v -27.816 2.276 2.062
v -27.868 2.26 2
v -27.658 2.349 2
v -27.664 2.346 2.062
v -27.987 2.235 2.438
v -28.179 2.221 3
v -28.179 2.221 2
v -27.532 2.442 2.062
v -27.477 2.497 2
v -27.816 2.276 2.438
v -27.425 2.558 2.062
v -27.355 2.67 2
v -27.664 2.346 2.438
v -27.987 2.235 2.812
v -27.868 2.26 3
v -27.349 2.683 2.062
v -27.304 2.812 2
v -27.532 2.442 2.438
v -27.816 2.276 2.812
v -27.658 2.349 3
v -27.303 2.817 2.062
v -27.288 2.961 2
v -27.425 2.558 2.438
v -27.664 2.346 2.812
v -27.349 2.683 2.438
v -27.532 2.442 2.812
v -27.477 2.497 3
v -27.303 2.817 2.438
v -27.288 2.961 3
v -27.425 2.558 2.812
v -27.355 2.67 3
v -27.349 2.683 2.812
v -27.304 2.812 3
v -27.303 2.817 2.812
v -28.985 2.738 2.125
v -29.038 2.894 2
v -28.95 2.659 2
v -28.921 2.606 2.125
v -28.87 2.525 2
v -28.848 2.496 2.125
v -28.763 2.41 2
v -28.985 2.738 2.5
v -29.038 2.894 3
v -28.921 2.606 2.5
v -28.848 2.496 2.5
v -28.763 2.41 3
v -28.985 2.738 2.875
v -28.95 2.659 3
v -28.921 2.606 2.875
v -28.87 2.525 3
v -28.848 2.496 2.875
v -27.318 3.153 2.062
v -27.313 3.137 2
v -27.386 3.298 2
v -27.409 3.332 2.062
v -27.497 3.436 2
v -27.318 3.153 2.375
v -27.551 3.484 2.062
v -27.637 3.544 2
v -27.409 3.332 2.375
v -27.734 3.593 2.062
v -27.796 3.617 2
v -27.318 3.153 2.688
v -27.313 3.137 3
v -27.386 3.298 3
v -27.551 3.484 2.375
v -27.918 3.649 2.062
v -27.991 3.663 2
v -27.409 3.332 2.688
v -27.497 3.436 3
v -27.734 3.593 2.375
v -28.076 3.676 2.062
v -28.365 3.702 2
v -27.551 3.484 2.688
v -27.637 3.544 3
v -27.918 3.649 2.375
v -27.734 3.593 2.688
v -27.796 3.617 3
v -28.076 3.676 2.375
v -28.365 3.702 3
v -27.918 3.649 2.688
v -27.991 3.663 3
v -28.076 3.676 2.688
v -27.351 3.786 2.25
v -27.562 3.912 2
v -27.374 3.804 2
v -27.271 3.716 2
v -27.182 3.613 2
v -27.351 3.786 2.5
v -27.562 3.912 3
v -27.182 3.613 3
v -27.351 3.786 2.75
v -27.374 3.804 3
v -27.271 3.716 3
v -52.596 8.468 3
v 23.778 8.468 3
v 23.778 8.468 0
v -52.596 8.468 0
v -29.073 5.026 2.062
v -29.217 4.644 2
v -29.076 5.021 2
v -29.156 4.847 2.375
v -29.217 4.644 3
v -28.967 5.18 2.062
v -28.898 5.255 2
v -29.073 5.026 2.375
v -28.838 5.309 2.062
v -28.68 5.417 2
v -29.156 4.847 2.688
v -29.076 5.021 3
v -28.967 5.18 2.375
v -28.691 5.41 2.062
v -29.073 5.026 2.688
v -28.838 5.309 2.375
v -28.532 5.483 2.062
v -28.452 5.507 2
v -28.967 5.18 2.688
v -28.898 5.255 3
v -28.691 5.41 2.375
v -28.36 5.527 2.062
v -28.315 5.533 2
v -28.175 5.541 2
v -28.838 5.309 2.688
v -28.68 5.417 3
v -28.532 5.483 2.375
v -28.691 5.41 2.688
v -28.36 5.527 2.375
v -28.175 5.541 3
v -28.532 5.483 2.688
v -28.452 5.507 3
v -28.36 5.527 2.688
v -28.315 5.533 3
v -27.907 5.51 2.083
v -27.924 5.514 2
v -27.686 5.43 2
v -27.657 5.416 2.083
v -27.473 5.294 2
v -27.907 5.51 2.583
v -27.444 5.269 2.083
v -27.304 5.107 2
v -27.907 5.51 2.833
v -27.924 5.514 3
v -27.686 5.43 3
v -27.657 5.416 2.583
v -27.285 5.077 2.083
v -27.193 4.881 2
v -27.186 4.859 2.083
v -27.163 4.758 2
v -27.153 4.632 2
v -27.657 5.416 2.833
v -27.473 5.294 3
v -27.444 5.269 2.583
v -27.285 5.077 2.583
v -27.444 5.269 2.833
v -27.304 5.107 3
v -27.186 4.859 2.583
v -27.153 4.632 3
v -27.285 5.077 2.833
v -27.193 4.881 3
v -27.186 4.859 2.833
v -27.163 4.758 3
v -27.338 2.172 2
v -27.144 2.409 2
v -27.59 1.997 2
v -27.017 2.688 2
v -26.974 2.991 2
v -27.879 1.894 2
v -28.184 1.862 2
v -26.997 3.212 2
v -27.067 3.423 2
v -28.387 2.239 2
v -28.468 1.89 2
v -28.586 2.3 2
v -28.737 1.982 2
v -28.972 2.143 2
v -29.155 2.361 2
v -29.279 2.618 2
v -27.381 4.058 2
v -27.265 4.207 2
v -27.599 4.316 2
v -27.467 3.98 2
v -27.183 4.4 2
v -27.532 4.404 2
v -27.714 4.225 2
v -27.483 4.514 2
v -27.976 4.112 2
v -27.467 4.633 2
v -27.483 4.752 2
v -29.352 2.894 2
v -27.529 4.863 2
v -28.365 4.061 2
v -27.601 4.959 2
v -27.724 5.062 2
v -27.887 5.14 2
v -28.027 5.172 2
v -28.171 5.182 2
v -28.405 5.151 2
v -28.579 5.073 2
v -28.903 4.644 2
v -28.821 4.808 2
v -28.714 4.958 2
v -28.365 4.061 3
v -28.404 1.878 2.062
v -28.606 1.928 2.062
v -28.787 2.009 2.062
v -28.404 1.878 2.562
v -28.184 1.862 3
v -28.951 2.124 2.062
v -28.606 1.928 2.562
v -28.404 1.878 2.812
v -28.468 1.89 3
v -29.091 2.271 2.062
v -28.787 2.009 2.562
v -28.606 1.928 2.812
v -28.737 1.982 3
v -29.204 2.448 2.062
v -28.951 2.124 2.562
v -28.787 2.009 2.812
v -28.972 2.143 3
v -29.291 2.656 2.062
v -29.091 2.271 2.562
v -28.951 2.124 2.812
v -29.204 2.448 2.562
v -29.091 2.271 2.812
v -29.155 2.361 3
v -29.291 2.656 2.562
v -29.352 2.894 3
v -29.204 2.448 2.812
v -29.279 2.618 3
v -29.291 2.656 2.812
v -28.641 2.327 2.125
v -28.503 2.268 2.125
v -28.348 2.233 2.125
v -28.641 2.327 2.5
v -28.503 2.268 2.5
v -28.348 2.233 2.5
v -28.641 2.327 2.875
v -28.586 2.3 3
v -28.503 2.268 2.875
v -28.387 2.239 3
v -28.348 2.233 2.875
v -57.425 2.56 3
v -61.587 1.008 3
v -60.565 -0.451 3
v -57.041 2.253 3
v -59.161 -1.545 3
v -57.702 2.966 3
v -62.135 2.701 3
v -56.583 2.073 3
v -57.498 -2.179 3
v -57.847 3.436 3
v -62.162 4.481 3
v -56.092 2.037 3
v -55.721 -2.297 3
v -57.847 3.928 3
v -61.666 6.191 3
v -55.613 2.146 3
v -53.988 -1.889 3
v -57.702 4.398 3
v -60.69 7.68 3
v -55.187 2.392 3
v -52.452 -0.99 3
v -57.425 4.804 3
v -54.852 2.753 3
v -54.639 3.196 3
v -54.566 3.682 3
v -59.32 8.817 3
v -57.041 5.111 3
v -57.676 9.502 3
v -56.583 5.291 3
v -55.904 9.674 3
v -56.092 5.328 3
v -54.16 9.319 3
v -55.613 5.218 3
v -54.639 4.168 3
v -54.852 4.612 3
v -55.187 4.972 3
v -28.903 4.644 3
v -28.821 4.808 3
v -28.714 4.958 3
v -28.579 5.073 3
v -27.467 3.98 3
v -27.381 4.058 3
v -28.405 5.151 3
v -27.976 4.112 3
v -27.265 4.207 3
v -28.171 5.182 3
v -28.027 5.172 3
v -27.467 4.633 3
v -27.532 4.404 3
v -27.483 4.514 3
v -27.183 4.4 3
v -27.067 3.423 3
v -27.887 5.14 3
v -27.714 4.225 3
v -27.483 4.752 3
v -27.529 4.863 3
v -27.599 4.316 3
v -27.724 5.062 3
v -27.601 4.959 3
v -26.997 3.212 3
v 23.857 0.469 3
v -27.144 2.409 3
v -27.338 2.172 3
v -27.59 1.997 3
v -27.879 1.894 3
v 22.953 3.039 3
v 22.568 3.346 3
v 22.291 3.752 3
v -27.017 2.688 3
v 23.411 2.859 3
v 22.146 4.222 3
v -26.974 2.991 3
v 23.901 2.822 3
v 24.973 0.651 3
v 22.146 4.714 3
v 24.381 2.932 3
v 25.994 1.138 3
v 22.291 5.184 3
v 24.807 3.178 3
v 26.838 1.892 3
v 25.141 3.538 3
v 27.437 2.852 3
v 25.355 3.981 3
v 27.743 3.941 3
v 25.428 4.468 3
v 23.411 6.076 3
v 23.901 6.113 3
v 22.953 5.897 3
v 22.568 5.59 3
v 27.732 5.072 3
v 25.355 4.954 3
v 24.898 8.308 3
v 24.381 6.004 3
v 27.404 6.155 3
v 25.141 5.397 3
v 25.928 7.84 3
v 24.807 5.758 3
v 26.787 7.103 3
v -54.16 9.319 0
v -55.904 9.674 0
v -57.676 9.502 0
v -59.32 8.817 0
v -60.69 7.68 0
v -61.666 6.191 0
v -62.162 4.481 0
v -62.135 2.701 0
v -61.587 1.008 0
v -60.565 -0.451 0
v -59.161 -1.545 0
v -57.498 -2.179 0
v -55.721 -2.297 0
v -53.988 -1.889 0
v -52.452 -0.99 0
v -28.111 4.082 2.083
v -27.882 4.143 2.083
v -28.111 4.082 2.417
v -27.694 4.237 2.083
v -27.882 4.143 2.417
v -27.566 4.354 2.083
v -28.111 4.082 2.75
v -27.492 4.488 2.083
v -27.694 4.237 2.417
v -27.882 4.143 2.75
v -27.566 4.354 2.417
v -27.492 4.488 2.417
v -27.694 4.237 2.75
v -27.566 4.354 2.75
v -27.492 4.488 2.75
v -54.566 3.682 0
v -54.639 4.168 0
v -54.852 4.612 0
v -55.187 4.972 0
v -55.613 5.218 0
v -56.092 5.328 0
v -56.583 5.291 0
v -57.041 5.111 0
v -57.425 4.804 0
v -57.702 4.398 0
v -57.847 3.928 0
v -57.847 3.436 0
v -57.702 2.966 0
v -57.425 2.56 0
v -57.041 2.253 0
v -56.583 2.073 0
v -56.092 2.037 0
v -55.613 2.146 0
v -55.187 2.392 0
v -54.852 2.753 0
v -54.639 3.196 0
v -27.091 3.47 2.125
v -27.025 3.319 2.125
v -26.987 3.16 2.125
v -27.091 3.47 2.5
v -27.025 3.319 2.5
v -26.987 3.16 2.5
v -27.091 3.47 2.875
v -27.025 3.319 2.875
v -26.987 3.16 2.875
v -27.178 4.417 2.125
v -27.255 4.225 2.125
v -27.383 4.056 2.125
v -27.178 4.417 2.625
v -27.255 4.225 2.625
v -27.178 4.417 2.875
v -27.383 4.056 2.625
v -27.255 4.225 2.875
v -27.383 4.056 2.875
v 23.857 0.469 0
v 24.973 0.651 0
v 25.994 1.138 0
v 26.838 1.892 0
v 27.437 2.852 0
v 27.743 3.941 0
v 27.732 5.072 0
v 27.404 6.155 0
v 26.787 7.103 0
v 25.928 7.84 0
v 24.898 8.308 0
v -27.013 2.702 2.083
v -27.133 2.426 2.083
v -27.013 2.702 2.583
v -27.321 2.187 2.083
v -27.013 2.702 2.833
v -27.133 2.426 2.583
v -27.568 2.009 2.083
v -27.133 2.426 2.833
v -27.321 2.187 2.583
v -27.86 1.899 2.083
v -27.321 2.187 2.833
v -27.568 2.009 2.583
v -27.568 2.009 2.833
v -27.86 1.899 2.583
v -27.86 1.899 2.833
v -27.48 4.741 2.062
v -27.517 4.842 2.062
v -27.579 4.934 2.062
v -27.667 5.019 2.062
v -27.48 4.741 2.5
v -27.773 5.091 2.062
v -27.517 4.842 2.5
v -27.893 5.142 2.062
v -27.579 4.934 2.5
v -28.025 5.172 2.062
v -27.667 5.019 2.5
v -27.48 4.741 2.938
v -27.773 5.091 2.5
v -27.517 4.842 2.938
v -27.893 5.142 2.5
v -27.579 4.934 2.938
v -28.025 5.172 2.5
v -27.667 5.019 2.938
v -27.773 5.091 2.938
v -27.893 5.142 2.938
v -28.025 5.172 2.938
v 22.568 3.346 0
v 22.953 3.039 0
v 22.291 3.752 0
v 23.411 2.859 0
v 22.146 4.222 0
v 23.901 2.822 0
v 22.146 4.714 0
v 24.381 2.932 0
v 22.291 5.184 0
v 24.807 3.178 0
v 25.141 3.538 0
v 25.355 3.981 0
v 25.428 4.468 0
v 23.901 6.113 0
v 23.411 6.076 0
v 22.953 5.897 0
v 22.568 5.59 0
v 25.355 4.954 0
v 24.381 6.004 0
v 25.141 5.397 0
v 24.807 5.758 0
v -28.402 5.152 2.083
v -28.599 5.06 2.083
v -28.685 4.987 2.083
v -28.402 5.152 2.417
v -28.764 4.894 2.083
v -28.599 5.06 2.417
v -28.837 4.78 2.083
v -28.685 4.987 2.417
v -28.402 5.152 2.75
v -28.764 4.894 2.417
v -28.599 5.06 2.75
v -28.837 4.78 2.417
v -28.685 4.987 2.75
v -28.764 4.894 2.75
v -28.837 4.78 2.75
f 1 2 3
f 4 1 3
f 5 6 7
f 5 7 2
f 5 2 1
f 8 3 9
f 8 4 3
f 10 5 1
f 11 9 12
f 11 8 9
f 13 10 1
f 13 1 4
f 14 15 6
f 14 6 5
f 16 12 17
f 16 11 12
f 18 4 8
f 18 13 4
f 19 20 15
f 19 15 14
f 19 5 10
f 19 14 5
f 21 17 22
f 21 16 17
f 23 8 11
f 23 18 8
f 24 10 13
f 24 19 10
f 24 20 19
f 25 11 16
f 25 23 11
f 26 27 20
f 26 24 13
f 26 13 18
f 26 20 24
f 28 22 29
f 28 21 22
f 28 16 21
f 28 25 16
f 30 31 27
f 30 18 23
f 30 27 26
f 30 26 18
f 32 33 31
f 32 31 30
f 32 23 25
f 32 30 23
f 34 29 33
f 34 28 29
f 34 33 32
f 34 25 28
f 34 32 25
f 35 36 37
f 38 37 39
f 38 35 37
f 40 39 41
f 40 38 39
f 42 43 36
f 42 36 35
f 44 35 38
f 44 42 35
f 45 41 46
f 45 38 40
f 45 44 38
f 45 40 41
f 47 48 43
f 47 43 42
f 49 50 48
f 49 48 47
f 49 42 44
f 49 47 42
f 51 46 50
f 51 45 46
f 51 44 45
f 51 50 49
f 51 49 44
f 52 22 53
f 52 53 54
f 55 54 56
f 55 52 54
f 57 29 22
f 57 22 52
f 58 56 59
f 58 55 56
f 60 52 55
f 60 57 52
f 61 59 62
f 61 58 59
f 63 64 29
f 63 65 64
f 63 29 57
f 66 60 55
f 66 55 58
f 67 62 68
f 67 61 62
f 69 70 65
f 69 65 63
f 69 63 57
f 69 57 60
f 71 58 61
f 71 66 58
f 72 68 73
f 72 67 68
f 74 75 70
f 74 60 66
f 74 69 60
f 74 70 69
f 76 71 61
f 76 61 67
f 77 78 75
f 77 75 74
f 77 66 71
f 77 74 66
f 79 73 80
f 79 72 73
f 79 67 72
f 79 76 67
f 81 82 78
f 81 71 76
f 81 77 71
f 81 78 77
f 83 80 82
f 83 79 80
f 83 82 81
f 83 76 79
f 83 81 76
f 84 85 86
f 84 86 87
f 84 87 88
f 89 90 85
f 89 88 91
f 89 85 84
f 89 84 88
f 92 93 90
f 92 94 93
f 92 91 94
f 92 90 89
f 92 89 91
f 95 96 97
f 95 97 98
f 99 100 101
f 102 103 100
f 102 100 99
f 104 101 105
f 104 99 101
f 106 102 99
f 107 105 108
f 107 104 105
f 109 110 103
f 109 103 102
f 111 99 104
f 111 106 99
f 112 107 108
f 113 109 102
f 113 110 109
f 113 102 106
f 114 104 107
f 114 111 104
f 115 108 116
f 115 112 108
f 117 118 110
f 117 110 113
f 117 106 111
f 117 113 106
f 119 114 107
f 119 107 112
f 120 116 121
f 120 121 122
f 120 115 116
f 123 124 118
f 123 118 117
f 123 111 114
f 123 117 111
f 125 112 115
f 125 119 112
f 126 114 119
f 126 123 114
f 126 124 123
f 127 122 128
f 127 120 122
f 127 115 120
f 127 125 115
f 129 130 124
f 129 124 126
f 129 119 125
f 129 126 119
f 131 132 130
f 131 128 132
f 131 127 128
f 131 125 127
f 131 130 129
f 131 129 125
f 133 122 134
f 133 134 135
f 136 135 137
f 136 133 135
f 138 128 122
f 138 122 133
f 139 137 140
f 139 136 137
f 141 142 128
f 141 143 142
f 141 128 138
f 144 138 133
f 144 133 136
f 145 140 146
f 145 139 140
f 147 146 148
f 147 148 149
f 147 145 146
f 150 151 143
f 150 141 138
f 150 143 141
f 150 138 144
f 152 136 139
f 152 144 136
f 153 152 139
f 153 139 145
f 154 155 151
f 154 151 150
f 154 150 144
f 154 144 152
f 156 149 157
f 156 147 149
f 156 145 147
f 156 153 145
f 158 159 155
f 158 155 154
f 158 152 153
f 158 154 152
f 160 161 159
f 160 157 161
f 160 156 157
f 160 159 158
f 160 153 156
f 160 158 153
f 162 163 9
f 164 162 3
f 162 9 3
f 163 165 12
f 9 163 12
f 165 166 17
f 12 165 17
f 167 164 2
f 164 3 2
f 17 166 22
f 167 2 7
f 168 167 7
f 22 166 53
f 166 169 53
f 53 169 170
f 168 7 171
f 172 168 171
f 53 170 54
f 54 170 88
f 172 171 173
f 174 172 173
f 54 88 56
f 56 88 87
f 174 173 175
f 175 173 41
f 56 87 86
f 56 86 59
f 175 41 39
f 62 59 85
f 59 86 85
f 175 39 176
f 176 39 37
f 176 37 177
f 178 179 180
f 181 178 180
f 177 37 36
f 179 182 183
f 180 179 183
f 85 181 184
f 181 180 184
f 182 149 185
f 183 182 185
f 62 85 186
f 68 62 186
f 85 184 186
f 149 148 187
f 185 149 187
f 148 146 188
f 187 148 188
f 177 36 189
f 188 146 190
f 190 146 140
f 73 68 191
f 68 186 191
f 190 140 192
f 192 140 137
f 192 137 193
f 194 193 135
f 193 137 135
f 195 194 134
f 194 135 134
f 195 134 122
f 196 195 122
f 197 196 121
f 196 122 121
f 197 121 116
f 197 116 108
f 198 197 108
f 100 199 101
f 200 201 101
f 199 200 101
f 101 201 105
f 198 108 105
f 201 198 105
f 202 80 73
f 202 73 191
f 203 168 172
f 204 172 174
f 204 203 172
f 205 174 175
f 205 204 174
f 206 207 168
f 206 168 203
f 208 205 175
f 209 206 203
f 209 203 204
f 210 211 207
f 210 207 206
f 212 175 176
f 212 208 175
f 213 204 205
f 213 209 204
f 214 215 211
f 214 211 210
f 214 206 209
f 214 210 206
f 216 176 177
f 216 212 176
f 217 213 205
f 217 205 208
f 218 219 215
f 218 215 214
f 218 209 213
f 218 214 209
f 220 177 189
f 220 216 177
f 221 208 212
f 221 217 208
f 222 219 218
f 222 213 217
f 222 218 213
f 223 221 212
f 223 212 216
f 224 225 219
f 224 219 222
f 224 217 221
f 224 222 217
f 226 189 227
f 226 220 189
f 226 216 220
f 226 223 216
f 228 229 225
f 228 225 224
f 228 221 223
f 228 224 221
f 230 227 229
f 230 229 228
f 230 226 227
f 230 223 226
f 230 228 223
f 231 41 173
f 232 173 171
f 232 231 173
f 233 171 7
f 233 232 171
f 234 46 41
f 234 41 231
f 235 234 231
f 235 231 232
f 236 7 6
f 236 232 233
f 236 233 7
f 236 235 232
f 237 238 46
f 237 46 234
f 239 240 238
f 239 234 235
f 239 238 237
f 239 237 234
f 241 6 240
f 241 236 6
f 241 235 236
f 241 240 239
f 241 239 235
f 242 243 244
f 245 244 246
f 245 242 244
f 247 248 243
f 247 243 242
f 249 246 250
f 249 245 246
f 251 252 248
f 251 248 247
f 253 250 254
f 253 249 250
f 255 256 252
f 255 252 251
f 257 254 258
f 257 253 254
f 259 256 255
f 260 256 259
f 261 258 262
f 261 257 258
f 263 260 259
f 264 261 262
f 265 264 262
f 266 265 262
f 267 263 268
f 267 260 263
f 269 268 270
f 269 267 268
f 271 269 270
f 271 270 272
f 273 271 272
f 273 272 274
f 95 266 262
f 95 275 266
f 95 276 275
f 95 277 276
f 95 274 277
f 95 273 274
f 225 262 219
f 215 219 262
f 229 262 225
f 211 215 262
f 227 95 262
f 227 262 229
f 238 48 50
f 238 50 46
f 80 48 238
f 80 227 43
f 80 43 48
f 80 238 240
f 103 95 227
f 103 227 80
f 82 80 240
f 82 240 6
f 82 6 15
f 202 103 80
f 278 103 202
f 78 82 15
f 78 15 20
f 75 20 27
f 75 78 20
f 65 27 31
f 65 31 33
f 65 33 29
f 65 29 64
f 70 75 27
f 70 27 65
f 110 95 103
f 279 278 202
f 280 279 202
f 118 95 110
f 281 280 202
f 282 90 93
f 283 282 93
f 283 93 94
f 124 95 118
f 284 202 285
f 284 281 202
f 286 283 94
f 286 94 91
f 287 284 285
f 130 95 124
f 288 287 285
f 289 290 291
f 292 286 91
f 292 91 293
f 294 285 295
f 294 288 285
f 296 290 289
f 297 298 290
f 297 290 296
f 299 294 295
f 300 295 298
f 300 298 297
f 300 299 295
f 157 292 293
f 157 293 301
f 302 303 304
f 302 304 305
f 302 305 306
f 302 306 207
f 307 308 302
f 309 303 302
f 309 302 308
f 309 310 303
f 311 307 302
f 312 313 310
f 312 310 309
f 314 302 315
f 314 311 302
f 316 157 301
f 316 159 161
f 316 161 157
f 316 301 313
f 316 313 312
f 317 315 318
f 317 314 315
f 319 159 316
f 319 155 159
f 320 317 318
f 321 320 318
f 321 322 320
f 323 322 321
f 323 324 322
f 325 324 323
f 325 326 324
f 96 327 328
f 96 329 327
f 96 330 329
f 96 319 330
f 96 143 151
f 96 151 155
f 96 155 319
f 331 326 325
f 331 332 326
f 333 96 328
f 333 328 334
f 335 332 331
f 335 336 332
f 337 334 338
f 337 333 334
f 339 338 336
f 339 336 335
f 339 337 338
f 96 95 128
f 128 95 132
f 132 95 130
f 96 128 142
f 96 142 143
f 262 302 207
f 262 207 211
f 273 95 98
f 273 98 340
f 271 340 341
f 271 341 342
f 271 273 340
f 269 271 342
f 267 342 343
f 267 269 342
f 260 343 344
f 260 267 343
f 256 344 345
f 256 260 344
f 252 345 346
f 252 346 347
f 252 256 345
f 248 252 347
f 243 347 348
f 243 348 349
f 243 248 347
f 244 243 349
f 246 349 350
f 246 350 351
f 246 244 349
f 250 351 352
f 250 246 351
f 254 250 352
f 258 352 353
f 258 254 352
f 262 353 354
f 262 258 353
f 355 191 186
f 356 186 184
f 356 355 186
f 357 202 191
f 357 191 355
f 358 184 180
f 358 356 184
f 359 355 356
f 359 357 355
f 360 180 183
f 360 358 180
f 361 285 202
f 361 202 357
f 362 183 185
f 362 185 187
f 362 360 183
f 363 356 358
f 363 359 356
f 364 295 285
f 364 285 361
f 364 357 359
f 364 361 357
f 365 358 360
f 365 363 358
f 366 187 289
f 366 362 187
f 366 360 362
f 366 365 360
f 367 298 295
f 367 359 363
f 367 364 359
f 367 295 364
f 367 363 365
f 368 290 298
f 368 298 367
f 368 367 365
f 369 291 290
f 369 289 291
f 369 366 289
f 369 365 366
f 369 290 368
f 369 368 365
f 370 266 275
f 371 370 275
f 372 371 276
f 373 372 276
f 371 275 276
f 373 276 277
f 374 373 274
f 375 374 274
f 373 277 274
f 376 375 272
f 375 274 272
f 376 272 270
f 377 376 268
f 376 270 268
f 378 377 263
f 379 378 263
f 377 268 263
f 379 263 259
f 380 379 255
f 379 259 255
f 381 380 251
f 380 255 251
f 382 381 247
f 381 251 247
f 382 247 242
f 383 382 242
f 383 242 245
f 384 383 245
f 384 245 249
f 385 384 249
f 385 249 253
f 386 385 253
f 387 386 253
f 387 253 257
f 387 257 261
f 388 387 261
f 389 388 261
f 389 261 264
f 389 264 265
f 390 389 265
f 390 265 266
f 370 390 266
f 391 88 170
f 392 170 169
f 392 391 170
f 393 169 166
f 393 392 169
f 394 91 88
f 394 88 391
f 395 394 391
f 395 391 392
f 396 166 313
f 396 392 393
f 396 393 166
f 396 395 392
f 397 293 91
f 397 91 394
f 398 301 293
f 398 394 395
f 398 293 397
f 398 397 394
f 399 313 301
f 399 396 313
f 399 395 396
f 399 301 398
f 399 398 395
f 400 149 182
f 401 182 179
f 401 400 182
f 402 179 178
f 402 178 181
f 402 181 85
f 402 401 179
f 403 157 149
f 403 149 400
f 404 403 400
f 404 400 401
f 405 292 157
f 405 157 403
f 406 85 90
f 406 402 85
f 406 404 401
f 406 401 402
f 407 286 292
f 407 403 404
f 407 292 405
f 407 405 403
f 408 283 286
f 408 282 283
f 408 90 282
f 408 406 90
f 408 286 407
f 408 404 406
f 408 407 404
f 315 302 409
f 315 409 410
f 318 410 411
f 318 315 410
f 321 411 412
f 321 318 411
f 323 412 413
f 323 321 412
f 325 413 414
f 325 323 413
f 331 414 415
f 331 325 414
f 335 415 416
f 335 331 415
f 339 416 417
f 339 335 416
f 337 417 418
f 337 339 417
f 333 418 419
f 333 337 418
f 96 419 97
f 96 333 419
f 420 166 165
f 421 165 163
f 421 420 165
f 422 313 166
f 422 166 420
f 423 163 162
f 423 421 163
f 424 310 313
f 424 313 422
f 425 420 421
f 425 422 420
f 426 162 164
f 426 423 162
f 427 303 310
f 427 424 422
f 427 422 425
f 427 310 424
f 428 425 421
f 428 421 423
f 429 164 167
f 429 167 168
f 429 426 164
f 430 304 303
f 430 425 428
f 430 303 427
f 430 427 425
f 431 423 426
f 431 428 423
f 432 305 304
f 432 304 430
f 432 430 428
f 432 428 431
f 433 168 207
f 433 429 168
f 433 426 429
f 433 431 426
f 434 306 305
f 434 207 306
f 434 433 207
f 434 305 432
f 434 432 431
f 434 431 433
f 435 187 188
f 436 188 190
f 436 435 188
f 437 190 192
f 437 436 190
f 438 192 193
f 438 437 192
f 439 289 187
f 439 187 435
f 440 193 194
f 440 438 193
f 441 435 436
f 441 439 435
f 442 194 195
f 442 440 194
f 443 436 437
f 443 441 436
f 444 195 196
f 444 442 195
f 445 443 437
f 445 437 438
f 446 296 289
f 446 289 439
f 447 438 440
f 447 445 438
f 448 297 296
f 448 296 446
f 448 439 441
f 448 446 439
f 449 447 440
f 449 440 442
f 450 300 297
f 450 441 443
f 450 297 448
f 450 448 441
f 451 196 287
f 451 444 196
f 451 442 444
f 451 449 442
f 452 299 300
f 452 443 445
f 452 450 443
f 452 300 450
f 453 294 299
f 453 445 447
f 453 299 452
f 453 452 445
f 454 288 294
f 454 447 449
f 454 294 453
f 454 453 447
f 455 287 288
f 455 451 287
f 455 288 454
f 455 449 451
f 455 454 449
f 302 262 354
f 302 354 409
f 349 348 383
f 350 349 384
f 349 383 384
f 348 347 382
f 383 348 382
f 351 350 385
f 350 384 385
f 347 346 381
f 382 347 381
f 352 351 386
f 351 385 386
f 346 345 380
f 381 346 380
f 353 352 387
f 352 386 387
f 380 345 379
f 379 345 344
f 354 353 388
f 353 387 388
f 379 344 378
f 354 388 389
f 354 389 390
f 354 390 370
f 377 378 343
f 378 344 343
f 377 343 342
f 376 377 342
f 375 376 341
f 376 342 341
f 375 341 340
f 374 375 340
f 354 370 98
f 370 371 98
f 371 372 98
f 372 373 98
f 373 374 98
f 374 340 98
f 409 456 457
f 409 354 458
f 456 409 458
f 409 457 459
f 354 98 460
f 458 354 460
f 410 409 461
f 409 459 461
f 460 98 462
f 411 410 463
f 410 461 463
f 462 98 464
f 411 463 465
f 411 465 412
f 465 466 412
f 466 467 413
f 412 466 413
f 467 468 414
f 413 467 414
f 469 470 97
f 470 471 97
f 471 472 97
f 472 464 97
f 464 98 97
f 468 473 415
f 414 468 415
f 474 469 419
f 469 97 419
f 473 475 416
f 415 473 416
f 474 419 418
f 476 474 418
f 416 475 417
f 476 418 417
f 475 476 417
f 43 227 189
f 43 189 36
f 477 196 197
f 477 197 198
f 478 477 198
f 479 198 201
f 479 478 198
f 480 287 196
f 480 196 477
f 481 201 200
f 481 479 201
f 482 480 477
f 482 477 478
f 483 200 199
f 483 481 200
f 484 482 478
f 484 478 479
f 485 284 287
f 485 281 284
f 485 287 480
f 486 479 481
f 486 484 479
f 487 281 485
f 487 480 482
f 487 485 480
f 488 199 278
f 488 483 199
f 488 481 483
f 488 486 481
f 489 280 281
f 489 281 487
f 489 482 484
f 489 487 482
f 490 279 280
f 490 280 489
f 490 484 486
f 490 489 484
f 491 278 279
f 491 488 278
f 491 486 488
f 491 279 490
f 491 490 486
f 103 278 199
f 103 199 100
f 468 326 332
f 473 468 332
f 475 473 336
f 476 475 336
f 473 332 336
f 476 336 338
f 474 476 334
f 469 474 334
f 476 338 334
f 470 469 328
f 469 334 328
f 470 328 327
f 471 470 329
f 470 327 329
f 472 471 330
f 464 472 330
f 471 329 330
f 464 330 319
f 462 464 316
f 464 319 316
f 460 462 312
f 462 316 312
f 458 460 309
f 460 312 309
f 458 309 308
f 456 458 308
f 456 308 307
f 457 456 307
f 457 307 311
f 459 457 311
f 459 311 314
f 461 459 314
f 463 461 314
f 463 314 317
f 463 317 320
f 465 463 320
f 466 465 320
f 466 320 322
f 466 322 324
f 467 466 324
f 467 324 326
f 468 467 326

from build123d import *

# Parameters (mm, degrees)
EXTRUDE_1_DEPTH         = 3
SKETCH_2_R              = 1.35
CUT_EXTRUDE_1_DEPTH     = 2.444444444
SKETCH_3_R              = 1.35
CUT_EXTRUDE_2_DEPTH     = 0.555555556
HOLE_WIZARD_2_7_2_7_1_D = 2.7
SKETCH_6_R              = 1.65
CUT_EXTRUDE_3_DEPTH     = 64.035907885
CUT_EXTRUDE_4_DEPTH     = 1


with BuildPart() as part:
    # 草图1 → 凸台-拉伸1 (new body)
    with BuildSketch(Plane.XY.offset(3)):
        with BuildLine():
            Line((23.778016459, 8.467622986), (-52.596358319, 8.467622986))
            ThreePointArc((-52.596358319, 8.467622986), (-62.214907854, 3.590303351), (-52.451603626, -0.990377005))
            Line((-52.451603626, -0.990377005), (23.856567017, 0.468594516))
            ThreePointArc((23.856567017, 0.468594516), (27.777721585, 4.50700022), (23.778016459, 8.467622986))
        make_face()
    extrude(amount=-EXTRUDE_1_DEPTH)

    # 草图2 → 切除-拉伸1 (cut)
    with BuildSketch(Plane.XY.offset(3)):
        with Locations(Location((23.77801746, 4.467622995, 0), (0, 0, 180))):
            Circle(SKETCH_2_R)
    extrude(amount=-CUT_EXTRUDE_1_DEPTH, mode=Mode.SUBTRACT)

    # 草图3 → 切除-拉伸2 (cut)
    with BuildSketch(Plane(origin=(0, 0, 0), x_dir=(-1, 0, 0), z_dir=(0, 0, -1))):
        with Locations(Location((-23.778017455, 4.467823177, 0), (0, 0, 359.991504025))):
            Circle(SKETCH_3_R)
    extrude(amount=-CUT_EXTRUDE_2_DEPTH, mode=Mode.SUBTRACT)

    # Ø2.7 (2.7) 直径孔1 (through all)
    with Locations(Plane.XY.offset(3)):
        with Locations((-56.215609969, 3.682122995)):
            Hole(HOLE_WIZARD_2_7_2_7_1_D / 2)

    # 草图6 → 切除-拉伸3 (cut, through all)
    with BuildSketch(Plane.XY.offset(3)):
        with Locations((-56.215609969, 3.682122995)):
            Circle(SKETCH_6_R)
        with Locations((23.778017455, 4.467823177)):
            Circle(SKETCH_6_R)
    extrude(amount=-CUT_EXTRUDE_3_DEPTH, mode=Mode.SUBTRACT)

    # 草图7 → 切除-拉伸4 (cut)
    with BuildSketch(Plane.XY.offset(3)):
        with BuildLine():
            Line((-28.902991884, 4.643891928), (-29.217094448, 4.643891928))
            add(Edge.make_bspline(
                [(-29.217094448, 4.643891928), (-29.208584898, 4.679124412), (-29.191949422, 4.748001036), (-29.157251849, 4.846408297), (-29.119452594, 4.939531818), (-29.074063489, 5.025627892), (-29.024554735, 5.106426795), (-28.967832013, 5.180095919), (-28.906512291, 5.248508885), (-28.838687341, 5.309222122), (-28.76755868, 5.364199852), (-28.69212406, 5.411074909), (-28.613901166, 5.451399062), (-28.532348033, 5.484619294), (-28.447221862, 5.509644817), (-28.359292238, 5.527801623), (-28.268328738, 5.539592737), (-28.206581148, 5.5407435), (-28.175227461, 5.541327825)],
                knots=[0, 0, 0, 0, 1.162005537, 2.271625781, 3.343758855, 4.383309926, 5.390229558, 6.379919256, 7.361854164, 8.333198761, 9.295911338, 10.242430842, 11.177959212, 12.116337295, 13.062827104, 14.020064771, 14.994644689, 16, 16, 16, 16], degree=3))
            add(Edge.make_bspline(
                [(-28.175227461, 5.541327825), (-28.129544719, 5.539948595), (-28.039175708, 5.53722022), (-27.906412661, 5.512305783), (-27.778385842, 5.472880651), (-27.656496594, 5.418406924), (-27.543278162, 5.35121961), (-27.442541975, 5.271254874), (-27.355653464, 5.180055572), (-27.282759087, 5.079323008), (-27.225684088, 4.971667498), (-27.183597714, 4.860867341), (-27.157976033, 4.74718537), (-27.154655476, 4.670428091), (-27.152991884, 4.631972857)],
                knots=[0, 0, 0, 0, 1.083050992, 2.142477498, 3.193116406, 4.255571735, 5.30263384, 6.308962982, 7.297363603, 8.282367274, 9.249857812, 10.179914175, 11.08814088, 12, 12, 12, 12], degree=3))
            add(Edge.make_bspline(
                [(-27.152991884, 4.631972857), (-27.154155475, 4.594966063), (-27.156432443, 4.522549508), (-27.175766148, 4.416828011), (-27.208302411, 4.317186411), (-27.253372174, 4.223205249), (-27.311713724, 4.135480409), (-27.382386421, 4.053814518), (-27.465889082, 3.97784536), (-27.52916802, 3.934325887), (-27.561745891, 3.911920774)],
                knots=[0, 0, 0, 0, 1.024540389, 2.004866551, 2.965041327, 3.920577974, 4.882998113, 5.874504559, 6.905732034, 8, 8, 8, 8], degree=3))
            add(Edge.make_bspline(
                [(-27.561745891, 3.911920774), (-27.524514136, 3.893942602), (-27.450747262, 3.858322645), (-27.350196732, 3.788466887), (-27.258918857, 3.70781054), (-27.208015138, 3.644867887), (-27.182439, 3.613242889)],
                knots=[0, 0, 0, 0, 1.015518401, 2.012035669, 3.001164323, 4, 4, 4, 4], degree=3))
            add(Edge.make_bspline(
                [(-27.182439, 3.613242889), (-27.165597657, 3.590185138), (-27.132190761, 3.544447221), (-27.090955228, 3.470910795), (-27.053546113, 3.396559306), (-27.024395894, 3.3193999), (-27.001822027, 3.240326886), (-26.985685995, 3.15920449), (-26.975661854, 3.075966468), (-26.974226302, 3.019653988), (-26.973504705, 2.991347857)],
                knots=[0, 0, 0, 0, 1.025084078, 2.033381695, 3.024893161, 4.013698104, 4.991890475, 5.976764909, 6.982997093, 8, 8, 8, 8], degree=3))
            add(Edge.make_bspline(
                [(-26.973504705, 2.991347857), (-26.975299218, 2.942338136), (-26.9788798, 2.844549334), (-27.010883875, 2.700074613), (-27.060497115, 2.55884911), (-27.130954051, 2.423774271), (-27.21682156, 2.29739389), (-27.318978884, 2.184317581), (-27.436265293, 2.087118977), (-27.567070942, 2.005908749), (-27.70878807, 1.940990827), (-27.860363662, 1.895933384), (-28.019613716, 1.866587384), (-28.128821014, 1.863440515), (-28.184342045, 1.861840646)],
                knots=[0, 0, 0, 0, 0.955779014, 1.907060117, 2.875433937, 3.871313158, 4.872415639, 5.851225146, 6.836215519, 7.83643374, 8.849228613, 9.86973379, 10.916971861, 12, 12, 12, 12], degree=3))
            add(Edge.make_bspline(
                [(-28.184342045, 1.861840646), (-28.221761345, 1.862708859), (-28.29539005, 1.864417213), (-28.403633548, 1.876095814), (-28.506955248, 1.89742582), (-28.605494846, 1.926129125), (-28.699339882, 1.962520867), (-28.788203987, 2.007839565), (-28.872633881, 2.061151067), (-28.951832832, 2.123084655), (-29.0257914, 2.192365995), (-29.092544124, 2.270225005), (-29.153203917, 2.355222409), (-29.206146555, 2.448345465), (-29.253783508, 2.548390722), (-29.292964465, 2.656639221), (-29.327450033, 2.772123243), (-29.343483498, 2.852600983), (-29.351709833, 2.893891928)],
                knots=[0, 0, 0, 0, 1.048658725, 2.063410685, 3.046034179, 4.001477787, 4.936774919, 5.862367409, 6.792675028, 7.730719943, 8.675894397, 9.627829632, 10.600096036, 11.597688215, 12.626045268, 13.701542398, 14.82072376, 16, 16, 16, 16], degree=3))
            Line((-29.351709833, 2.893891928), (-29.037607269, 2.893891928))
            add(Edge.make_bspline(
                [(-29.037607269, 2.893891928), (-29.029423978, 2.866942915), (-29.013506765, 2.814524743), (-28.986412467, 2.739084437), (-28.955544195, 2.669926384), (-28.922429636, 2.606543262), (-28.88765119, 2.54831086), (-28.848736265, 2.496768991), (-28.80856712, 2.449653788), (-28.778287766, 2.423109176), (-28.763468647, 2.410117889)],
                knots=[0, 0, 0, 0, 1.198163088, 2.33053128, 3.407730985, 4.417276592, 5.372219308, 6.28897303, 7.162600585, 8, 8, 8, 8], degree=3))
            add(Edge.make_bspline(
                [(-28.763468647, 2.410117889), (-28.743872071, 2.395009556), (-28.704739408, 2.364839524), (-28.640971177, 2.326337895), (-28.573906291, 2.29297687), (-28.502091616, 2.267493174), (-28.427076846, 2.245915513), (-28.347649481, 2.231794994), (-28.264510264, 2.222106823), (-28.2077425, 2.221251891), (-28.17873307, 2.220815005)],
                knots=[0, 0, 0, 0, 0.946170439, 1.889420265, 2.845303464, 3.807233317, 4.801018734, 5.828864929, 6.890507805, 8, 8, 8, 8], degree=3))
            add(Edge.make_bspline(
                [(-28.17873307, 2.220815005), (-28.145979568, 2.22143091), (-28.081932921, 2.22263526), (-27.988478061, 2.233710966), (-27.899570614, 2.24984138), (-27.816197688, 2.274754363), (-27.737267181, 2.305535214), (-27.663885531, 2.34418362), (-27.595089425, 2.389528341), (-27.531760019, 2.4410675), (-27.474814512, 2.497488995), (-27.424674999, 2.556502066), (-27.382050337, 2.617857896), (-27.347666759, 2.681896016), (-27.320516209, 2.748351245), (-27.302033008, 2.817410075), (-27.289181493, 2.888507341), (-27.288134881, 2.93683631), (-27.287607269, 2.96119962)],
                knots=[0, 0, 0, 0, 1.217147791, 2.380027433, 3.494444702, 4.572153297, 5.609568379, 6.639424714, 7.649109417, 8.668170816, 9.669597737, 10.625200337, 11.543417969, 12.441394052, 13.322311151, 14.205496177, 15.095365482, 16, 16, 16, 16], degree=3))
            add(Edge.make_bspline(
                [(-27.287607269, 2.96119962), (-27.289137571, 2.993810959), (-27.292190559, 3.058871367), (-27.315499138, 3.154588942), (-27.353838003, 3.246812354), (-27.407510514, 3.333968144), (-27.472846243, 3.414744046), (-27.549211149, 3.486815528), (-27.637239378, 3.546285619), (-27.718259247, 3.587374276), (-27.790024403, 3.615411351), (-27.851439788, 3.634086315), (-27.920196391, 3.649899971), (-27.99546274, 3.664612242), (-28.077805957, 3.677133591), (-28.167136394, 3.687575406), (-28.263472156, 3.695930447), (-28.330163322, 3.699661543), (-28.364530346, 3.701584236)],
                knots=[0, 0, 0, 0, 1.07054697, 2.135767047, 3.216561865, 4.33974944, 5.486079747, 6.621378074, 7.775625952, 8.963672916, 9.598146892, 10.304877434, 11.070270905, 11.915000392, 12.823868403, 13.805723172, 14.86925407, 16, 16, 16, 16], degree=3))
            Line((-28.364530346, 3.701584236), (-28.364530346, 4.060558595))
            add(Edge.make_bspline(
                [(-28.364530346, 4.060558595), (-28.32122918, 4.061293398), (-28.236412834, 4.062732698), (-28.112518529, 4.080140709), (-27.994045217, 4.104221337), (-27.883618475, 4.141106529), (-27.782969761, 4.183946826), (-27.695650159, 4.233799035), (-27.622883012, 4.289213785), (-27.565021941, 4.351046394), (-27.521492712, 4.417361441), (-27.489665914, 4.486478099), (-27.470865588, 4.55900216), (-27.468355921, 4.608496828), (-27.467094448, 4.633375101)],
                knots=[0, 0, 0, 0, 1.321986639, 2.589447074, 3.816329219, 5.01088745, 6.139805852, 7.153945165, 8.075214402, 8.924034688, 9.728124013, 10.488707548, 11.240355623, 12, 12, 12, 12], degree=3))
            add(Edge.make_bspline(
                [(-27.467094448, 4.633375101), (-27.467508859, 4.651652846), (-27.46833331, 4.688015553), (-27.478730588, 4.741140622), (-27.494354629, 4.792641568), (-27.515834358, 4.842299378), (-27.544584557, 4.889769652), (-27.578990544, 4.935457101), (-27.619958644, 4.97910088), (-27.666904091, 5.019781199), (-27.717315896, 5.058550437), (-27.772565671, 5.091464074), (-27.830987546, 5.119609136), (-27.892646201, 5.142818638), (-27.957741731, 5.160277926), (-28.025968289, 5.172813767), (-28.097455972, 5.180651422), (-28.146227704, 5.181779838), (-28.171020731, 5.182353466)],
                knots=[0, 0, 0, 0, 0.884392785, 1.759457502, 2.611959086, 3.489218968, 4.37281399, 5.2945488, 6.255912374, 7.266815255, 8.301784654, 9.332968512, 10.37626691, 11.440494194, 12.520033166, 13.637162961, 14.798855837, 16, 16, 16, 16], degree=3))
            add(Edge.make_bspline(
                [(-28.171020731, 5.182353466), (-28.210872399, 5.180962104), (-28.288711975, 5.178244451), (-28.400926892, 5.154441437), (-28.505246226, 5.116463354), (-28.584984892, 5.071130334), (-28.643867467, 5.026379901), (-28.685944405, 4.987297514), (-28.727264915, 4.94386469), (-28.765110592, 4.893406315), (-28.803384569, 4.839339525), (-28.83822913, 4.778915843), (-28.872088822, 4.713711449), (-28.892491372, 4.667615815), (-28.902991884, 4.643891928)],
                knots=[0, 0, 0, 0, 1.472543308, 2.876219568, 4.221790263, 5.565193594, 6.249813518, 6.953379497, 7.687249741, 8.463570142, 9.283606569, 10.136032583, 11.040678096, 12, 12, 12, 12], degree=3))
        make_face()
    extrude(amount=-CUT_EXTRUDE_4_DEPTH, mode=Mode.SUBTRACT)


solid = part.part
